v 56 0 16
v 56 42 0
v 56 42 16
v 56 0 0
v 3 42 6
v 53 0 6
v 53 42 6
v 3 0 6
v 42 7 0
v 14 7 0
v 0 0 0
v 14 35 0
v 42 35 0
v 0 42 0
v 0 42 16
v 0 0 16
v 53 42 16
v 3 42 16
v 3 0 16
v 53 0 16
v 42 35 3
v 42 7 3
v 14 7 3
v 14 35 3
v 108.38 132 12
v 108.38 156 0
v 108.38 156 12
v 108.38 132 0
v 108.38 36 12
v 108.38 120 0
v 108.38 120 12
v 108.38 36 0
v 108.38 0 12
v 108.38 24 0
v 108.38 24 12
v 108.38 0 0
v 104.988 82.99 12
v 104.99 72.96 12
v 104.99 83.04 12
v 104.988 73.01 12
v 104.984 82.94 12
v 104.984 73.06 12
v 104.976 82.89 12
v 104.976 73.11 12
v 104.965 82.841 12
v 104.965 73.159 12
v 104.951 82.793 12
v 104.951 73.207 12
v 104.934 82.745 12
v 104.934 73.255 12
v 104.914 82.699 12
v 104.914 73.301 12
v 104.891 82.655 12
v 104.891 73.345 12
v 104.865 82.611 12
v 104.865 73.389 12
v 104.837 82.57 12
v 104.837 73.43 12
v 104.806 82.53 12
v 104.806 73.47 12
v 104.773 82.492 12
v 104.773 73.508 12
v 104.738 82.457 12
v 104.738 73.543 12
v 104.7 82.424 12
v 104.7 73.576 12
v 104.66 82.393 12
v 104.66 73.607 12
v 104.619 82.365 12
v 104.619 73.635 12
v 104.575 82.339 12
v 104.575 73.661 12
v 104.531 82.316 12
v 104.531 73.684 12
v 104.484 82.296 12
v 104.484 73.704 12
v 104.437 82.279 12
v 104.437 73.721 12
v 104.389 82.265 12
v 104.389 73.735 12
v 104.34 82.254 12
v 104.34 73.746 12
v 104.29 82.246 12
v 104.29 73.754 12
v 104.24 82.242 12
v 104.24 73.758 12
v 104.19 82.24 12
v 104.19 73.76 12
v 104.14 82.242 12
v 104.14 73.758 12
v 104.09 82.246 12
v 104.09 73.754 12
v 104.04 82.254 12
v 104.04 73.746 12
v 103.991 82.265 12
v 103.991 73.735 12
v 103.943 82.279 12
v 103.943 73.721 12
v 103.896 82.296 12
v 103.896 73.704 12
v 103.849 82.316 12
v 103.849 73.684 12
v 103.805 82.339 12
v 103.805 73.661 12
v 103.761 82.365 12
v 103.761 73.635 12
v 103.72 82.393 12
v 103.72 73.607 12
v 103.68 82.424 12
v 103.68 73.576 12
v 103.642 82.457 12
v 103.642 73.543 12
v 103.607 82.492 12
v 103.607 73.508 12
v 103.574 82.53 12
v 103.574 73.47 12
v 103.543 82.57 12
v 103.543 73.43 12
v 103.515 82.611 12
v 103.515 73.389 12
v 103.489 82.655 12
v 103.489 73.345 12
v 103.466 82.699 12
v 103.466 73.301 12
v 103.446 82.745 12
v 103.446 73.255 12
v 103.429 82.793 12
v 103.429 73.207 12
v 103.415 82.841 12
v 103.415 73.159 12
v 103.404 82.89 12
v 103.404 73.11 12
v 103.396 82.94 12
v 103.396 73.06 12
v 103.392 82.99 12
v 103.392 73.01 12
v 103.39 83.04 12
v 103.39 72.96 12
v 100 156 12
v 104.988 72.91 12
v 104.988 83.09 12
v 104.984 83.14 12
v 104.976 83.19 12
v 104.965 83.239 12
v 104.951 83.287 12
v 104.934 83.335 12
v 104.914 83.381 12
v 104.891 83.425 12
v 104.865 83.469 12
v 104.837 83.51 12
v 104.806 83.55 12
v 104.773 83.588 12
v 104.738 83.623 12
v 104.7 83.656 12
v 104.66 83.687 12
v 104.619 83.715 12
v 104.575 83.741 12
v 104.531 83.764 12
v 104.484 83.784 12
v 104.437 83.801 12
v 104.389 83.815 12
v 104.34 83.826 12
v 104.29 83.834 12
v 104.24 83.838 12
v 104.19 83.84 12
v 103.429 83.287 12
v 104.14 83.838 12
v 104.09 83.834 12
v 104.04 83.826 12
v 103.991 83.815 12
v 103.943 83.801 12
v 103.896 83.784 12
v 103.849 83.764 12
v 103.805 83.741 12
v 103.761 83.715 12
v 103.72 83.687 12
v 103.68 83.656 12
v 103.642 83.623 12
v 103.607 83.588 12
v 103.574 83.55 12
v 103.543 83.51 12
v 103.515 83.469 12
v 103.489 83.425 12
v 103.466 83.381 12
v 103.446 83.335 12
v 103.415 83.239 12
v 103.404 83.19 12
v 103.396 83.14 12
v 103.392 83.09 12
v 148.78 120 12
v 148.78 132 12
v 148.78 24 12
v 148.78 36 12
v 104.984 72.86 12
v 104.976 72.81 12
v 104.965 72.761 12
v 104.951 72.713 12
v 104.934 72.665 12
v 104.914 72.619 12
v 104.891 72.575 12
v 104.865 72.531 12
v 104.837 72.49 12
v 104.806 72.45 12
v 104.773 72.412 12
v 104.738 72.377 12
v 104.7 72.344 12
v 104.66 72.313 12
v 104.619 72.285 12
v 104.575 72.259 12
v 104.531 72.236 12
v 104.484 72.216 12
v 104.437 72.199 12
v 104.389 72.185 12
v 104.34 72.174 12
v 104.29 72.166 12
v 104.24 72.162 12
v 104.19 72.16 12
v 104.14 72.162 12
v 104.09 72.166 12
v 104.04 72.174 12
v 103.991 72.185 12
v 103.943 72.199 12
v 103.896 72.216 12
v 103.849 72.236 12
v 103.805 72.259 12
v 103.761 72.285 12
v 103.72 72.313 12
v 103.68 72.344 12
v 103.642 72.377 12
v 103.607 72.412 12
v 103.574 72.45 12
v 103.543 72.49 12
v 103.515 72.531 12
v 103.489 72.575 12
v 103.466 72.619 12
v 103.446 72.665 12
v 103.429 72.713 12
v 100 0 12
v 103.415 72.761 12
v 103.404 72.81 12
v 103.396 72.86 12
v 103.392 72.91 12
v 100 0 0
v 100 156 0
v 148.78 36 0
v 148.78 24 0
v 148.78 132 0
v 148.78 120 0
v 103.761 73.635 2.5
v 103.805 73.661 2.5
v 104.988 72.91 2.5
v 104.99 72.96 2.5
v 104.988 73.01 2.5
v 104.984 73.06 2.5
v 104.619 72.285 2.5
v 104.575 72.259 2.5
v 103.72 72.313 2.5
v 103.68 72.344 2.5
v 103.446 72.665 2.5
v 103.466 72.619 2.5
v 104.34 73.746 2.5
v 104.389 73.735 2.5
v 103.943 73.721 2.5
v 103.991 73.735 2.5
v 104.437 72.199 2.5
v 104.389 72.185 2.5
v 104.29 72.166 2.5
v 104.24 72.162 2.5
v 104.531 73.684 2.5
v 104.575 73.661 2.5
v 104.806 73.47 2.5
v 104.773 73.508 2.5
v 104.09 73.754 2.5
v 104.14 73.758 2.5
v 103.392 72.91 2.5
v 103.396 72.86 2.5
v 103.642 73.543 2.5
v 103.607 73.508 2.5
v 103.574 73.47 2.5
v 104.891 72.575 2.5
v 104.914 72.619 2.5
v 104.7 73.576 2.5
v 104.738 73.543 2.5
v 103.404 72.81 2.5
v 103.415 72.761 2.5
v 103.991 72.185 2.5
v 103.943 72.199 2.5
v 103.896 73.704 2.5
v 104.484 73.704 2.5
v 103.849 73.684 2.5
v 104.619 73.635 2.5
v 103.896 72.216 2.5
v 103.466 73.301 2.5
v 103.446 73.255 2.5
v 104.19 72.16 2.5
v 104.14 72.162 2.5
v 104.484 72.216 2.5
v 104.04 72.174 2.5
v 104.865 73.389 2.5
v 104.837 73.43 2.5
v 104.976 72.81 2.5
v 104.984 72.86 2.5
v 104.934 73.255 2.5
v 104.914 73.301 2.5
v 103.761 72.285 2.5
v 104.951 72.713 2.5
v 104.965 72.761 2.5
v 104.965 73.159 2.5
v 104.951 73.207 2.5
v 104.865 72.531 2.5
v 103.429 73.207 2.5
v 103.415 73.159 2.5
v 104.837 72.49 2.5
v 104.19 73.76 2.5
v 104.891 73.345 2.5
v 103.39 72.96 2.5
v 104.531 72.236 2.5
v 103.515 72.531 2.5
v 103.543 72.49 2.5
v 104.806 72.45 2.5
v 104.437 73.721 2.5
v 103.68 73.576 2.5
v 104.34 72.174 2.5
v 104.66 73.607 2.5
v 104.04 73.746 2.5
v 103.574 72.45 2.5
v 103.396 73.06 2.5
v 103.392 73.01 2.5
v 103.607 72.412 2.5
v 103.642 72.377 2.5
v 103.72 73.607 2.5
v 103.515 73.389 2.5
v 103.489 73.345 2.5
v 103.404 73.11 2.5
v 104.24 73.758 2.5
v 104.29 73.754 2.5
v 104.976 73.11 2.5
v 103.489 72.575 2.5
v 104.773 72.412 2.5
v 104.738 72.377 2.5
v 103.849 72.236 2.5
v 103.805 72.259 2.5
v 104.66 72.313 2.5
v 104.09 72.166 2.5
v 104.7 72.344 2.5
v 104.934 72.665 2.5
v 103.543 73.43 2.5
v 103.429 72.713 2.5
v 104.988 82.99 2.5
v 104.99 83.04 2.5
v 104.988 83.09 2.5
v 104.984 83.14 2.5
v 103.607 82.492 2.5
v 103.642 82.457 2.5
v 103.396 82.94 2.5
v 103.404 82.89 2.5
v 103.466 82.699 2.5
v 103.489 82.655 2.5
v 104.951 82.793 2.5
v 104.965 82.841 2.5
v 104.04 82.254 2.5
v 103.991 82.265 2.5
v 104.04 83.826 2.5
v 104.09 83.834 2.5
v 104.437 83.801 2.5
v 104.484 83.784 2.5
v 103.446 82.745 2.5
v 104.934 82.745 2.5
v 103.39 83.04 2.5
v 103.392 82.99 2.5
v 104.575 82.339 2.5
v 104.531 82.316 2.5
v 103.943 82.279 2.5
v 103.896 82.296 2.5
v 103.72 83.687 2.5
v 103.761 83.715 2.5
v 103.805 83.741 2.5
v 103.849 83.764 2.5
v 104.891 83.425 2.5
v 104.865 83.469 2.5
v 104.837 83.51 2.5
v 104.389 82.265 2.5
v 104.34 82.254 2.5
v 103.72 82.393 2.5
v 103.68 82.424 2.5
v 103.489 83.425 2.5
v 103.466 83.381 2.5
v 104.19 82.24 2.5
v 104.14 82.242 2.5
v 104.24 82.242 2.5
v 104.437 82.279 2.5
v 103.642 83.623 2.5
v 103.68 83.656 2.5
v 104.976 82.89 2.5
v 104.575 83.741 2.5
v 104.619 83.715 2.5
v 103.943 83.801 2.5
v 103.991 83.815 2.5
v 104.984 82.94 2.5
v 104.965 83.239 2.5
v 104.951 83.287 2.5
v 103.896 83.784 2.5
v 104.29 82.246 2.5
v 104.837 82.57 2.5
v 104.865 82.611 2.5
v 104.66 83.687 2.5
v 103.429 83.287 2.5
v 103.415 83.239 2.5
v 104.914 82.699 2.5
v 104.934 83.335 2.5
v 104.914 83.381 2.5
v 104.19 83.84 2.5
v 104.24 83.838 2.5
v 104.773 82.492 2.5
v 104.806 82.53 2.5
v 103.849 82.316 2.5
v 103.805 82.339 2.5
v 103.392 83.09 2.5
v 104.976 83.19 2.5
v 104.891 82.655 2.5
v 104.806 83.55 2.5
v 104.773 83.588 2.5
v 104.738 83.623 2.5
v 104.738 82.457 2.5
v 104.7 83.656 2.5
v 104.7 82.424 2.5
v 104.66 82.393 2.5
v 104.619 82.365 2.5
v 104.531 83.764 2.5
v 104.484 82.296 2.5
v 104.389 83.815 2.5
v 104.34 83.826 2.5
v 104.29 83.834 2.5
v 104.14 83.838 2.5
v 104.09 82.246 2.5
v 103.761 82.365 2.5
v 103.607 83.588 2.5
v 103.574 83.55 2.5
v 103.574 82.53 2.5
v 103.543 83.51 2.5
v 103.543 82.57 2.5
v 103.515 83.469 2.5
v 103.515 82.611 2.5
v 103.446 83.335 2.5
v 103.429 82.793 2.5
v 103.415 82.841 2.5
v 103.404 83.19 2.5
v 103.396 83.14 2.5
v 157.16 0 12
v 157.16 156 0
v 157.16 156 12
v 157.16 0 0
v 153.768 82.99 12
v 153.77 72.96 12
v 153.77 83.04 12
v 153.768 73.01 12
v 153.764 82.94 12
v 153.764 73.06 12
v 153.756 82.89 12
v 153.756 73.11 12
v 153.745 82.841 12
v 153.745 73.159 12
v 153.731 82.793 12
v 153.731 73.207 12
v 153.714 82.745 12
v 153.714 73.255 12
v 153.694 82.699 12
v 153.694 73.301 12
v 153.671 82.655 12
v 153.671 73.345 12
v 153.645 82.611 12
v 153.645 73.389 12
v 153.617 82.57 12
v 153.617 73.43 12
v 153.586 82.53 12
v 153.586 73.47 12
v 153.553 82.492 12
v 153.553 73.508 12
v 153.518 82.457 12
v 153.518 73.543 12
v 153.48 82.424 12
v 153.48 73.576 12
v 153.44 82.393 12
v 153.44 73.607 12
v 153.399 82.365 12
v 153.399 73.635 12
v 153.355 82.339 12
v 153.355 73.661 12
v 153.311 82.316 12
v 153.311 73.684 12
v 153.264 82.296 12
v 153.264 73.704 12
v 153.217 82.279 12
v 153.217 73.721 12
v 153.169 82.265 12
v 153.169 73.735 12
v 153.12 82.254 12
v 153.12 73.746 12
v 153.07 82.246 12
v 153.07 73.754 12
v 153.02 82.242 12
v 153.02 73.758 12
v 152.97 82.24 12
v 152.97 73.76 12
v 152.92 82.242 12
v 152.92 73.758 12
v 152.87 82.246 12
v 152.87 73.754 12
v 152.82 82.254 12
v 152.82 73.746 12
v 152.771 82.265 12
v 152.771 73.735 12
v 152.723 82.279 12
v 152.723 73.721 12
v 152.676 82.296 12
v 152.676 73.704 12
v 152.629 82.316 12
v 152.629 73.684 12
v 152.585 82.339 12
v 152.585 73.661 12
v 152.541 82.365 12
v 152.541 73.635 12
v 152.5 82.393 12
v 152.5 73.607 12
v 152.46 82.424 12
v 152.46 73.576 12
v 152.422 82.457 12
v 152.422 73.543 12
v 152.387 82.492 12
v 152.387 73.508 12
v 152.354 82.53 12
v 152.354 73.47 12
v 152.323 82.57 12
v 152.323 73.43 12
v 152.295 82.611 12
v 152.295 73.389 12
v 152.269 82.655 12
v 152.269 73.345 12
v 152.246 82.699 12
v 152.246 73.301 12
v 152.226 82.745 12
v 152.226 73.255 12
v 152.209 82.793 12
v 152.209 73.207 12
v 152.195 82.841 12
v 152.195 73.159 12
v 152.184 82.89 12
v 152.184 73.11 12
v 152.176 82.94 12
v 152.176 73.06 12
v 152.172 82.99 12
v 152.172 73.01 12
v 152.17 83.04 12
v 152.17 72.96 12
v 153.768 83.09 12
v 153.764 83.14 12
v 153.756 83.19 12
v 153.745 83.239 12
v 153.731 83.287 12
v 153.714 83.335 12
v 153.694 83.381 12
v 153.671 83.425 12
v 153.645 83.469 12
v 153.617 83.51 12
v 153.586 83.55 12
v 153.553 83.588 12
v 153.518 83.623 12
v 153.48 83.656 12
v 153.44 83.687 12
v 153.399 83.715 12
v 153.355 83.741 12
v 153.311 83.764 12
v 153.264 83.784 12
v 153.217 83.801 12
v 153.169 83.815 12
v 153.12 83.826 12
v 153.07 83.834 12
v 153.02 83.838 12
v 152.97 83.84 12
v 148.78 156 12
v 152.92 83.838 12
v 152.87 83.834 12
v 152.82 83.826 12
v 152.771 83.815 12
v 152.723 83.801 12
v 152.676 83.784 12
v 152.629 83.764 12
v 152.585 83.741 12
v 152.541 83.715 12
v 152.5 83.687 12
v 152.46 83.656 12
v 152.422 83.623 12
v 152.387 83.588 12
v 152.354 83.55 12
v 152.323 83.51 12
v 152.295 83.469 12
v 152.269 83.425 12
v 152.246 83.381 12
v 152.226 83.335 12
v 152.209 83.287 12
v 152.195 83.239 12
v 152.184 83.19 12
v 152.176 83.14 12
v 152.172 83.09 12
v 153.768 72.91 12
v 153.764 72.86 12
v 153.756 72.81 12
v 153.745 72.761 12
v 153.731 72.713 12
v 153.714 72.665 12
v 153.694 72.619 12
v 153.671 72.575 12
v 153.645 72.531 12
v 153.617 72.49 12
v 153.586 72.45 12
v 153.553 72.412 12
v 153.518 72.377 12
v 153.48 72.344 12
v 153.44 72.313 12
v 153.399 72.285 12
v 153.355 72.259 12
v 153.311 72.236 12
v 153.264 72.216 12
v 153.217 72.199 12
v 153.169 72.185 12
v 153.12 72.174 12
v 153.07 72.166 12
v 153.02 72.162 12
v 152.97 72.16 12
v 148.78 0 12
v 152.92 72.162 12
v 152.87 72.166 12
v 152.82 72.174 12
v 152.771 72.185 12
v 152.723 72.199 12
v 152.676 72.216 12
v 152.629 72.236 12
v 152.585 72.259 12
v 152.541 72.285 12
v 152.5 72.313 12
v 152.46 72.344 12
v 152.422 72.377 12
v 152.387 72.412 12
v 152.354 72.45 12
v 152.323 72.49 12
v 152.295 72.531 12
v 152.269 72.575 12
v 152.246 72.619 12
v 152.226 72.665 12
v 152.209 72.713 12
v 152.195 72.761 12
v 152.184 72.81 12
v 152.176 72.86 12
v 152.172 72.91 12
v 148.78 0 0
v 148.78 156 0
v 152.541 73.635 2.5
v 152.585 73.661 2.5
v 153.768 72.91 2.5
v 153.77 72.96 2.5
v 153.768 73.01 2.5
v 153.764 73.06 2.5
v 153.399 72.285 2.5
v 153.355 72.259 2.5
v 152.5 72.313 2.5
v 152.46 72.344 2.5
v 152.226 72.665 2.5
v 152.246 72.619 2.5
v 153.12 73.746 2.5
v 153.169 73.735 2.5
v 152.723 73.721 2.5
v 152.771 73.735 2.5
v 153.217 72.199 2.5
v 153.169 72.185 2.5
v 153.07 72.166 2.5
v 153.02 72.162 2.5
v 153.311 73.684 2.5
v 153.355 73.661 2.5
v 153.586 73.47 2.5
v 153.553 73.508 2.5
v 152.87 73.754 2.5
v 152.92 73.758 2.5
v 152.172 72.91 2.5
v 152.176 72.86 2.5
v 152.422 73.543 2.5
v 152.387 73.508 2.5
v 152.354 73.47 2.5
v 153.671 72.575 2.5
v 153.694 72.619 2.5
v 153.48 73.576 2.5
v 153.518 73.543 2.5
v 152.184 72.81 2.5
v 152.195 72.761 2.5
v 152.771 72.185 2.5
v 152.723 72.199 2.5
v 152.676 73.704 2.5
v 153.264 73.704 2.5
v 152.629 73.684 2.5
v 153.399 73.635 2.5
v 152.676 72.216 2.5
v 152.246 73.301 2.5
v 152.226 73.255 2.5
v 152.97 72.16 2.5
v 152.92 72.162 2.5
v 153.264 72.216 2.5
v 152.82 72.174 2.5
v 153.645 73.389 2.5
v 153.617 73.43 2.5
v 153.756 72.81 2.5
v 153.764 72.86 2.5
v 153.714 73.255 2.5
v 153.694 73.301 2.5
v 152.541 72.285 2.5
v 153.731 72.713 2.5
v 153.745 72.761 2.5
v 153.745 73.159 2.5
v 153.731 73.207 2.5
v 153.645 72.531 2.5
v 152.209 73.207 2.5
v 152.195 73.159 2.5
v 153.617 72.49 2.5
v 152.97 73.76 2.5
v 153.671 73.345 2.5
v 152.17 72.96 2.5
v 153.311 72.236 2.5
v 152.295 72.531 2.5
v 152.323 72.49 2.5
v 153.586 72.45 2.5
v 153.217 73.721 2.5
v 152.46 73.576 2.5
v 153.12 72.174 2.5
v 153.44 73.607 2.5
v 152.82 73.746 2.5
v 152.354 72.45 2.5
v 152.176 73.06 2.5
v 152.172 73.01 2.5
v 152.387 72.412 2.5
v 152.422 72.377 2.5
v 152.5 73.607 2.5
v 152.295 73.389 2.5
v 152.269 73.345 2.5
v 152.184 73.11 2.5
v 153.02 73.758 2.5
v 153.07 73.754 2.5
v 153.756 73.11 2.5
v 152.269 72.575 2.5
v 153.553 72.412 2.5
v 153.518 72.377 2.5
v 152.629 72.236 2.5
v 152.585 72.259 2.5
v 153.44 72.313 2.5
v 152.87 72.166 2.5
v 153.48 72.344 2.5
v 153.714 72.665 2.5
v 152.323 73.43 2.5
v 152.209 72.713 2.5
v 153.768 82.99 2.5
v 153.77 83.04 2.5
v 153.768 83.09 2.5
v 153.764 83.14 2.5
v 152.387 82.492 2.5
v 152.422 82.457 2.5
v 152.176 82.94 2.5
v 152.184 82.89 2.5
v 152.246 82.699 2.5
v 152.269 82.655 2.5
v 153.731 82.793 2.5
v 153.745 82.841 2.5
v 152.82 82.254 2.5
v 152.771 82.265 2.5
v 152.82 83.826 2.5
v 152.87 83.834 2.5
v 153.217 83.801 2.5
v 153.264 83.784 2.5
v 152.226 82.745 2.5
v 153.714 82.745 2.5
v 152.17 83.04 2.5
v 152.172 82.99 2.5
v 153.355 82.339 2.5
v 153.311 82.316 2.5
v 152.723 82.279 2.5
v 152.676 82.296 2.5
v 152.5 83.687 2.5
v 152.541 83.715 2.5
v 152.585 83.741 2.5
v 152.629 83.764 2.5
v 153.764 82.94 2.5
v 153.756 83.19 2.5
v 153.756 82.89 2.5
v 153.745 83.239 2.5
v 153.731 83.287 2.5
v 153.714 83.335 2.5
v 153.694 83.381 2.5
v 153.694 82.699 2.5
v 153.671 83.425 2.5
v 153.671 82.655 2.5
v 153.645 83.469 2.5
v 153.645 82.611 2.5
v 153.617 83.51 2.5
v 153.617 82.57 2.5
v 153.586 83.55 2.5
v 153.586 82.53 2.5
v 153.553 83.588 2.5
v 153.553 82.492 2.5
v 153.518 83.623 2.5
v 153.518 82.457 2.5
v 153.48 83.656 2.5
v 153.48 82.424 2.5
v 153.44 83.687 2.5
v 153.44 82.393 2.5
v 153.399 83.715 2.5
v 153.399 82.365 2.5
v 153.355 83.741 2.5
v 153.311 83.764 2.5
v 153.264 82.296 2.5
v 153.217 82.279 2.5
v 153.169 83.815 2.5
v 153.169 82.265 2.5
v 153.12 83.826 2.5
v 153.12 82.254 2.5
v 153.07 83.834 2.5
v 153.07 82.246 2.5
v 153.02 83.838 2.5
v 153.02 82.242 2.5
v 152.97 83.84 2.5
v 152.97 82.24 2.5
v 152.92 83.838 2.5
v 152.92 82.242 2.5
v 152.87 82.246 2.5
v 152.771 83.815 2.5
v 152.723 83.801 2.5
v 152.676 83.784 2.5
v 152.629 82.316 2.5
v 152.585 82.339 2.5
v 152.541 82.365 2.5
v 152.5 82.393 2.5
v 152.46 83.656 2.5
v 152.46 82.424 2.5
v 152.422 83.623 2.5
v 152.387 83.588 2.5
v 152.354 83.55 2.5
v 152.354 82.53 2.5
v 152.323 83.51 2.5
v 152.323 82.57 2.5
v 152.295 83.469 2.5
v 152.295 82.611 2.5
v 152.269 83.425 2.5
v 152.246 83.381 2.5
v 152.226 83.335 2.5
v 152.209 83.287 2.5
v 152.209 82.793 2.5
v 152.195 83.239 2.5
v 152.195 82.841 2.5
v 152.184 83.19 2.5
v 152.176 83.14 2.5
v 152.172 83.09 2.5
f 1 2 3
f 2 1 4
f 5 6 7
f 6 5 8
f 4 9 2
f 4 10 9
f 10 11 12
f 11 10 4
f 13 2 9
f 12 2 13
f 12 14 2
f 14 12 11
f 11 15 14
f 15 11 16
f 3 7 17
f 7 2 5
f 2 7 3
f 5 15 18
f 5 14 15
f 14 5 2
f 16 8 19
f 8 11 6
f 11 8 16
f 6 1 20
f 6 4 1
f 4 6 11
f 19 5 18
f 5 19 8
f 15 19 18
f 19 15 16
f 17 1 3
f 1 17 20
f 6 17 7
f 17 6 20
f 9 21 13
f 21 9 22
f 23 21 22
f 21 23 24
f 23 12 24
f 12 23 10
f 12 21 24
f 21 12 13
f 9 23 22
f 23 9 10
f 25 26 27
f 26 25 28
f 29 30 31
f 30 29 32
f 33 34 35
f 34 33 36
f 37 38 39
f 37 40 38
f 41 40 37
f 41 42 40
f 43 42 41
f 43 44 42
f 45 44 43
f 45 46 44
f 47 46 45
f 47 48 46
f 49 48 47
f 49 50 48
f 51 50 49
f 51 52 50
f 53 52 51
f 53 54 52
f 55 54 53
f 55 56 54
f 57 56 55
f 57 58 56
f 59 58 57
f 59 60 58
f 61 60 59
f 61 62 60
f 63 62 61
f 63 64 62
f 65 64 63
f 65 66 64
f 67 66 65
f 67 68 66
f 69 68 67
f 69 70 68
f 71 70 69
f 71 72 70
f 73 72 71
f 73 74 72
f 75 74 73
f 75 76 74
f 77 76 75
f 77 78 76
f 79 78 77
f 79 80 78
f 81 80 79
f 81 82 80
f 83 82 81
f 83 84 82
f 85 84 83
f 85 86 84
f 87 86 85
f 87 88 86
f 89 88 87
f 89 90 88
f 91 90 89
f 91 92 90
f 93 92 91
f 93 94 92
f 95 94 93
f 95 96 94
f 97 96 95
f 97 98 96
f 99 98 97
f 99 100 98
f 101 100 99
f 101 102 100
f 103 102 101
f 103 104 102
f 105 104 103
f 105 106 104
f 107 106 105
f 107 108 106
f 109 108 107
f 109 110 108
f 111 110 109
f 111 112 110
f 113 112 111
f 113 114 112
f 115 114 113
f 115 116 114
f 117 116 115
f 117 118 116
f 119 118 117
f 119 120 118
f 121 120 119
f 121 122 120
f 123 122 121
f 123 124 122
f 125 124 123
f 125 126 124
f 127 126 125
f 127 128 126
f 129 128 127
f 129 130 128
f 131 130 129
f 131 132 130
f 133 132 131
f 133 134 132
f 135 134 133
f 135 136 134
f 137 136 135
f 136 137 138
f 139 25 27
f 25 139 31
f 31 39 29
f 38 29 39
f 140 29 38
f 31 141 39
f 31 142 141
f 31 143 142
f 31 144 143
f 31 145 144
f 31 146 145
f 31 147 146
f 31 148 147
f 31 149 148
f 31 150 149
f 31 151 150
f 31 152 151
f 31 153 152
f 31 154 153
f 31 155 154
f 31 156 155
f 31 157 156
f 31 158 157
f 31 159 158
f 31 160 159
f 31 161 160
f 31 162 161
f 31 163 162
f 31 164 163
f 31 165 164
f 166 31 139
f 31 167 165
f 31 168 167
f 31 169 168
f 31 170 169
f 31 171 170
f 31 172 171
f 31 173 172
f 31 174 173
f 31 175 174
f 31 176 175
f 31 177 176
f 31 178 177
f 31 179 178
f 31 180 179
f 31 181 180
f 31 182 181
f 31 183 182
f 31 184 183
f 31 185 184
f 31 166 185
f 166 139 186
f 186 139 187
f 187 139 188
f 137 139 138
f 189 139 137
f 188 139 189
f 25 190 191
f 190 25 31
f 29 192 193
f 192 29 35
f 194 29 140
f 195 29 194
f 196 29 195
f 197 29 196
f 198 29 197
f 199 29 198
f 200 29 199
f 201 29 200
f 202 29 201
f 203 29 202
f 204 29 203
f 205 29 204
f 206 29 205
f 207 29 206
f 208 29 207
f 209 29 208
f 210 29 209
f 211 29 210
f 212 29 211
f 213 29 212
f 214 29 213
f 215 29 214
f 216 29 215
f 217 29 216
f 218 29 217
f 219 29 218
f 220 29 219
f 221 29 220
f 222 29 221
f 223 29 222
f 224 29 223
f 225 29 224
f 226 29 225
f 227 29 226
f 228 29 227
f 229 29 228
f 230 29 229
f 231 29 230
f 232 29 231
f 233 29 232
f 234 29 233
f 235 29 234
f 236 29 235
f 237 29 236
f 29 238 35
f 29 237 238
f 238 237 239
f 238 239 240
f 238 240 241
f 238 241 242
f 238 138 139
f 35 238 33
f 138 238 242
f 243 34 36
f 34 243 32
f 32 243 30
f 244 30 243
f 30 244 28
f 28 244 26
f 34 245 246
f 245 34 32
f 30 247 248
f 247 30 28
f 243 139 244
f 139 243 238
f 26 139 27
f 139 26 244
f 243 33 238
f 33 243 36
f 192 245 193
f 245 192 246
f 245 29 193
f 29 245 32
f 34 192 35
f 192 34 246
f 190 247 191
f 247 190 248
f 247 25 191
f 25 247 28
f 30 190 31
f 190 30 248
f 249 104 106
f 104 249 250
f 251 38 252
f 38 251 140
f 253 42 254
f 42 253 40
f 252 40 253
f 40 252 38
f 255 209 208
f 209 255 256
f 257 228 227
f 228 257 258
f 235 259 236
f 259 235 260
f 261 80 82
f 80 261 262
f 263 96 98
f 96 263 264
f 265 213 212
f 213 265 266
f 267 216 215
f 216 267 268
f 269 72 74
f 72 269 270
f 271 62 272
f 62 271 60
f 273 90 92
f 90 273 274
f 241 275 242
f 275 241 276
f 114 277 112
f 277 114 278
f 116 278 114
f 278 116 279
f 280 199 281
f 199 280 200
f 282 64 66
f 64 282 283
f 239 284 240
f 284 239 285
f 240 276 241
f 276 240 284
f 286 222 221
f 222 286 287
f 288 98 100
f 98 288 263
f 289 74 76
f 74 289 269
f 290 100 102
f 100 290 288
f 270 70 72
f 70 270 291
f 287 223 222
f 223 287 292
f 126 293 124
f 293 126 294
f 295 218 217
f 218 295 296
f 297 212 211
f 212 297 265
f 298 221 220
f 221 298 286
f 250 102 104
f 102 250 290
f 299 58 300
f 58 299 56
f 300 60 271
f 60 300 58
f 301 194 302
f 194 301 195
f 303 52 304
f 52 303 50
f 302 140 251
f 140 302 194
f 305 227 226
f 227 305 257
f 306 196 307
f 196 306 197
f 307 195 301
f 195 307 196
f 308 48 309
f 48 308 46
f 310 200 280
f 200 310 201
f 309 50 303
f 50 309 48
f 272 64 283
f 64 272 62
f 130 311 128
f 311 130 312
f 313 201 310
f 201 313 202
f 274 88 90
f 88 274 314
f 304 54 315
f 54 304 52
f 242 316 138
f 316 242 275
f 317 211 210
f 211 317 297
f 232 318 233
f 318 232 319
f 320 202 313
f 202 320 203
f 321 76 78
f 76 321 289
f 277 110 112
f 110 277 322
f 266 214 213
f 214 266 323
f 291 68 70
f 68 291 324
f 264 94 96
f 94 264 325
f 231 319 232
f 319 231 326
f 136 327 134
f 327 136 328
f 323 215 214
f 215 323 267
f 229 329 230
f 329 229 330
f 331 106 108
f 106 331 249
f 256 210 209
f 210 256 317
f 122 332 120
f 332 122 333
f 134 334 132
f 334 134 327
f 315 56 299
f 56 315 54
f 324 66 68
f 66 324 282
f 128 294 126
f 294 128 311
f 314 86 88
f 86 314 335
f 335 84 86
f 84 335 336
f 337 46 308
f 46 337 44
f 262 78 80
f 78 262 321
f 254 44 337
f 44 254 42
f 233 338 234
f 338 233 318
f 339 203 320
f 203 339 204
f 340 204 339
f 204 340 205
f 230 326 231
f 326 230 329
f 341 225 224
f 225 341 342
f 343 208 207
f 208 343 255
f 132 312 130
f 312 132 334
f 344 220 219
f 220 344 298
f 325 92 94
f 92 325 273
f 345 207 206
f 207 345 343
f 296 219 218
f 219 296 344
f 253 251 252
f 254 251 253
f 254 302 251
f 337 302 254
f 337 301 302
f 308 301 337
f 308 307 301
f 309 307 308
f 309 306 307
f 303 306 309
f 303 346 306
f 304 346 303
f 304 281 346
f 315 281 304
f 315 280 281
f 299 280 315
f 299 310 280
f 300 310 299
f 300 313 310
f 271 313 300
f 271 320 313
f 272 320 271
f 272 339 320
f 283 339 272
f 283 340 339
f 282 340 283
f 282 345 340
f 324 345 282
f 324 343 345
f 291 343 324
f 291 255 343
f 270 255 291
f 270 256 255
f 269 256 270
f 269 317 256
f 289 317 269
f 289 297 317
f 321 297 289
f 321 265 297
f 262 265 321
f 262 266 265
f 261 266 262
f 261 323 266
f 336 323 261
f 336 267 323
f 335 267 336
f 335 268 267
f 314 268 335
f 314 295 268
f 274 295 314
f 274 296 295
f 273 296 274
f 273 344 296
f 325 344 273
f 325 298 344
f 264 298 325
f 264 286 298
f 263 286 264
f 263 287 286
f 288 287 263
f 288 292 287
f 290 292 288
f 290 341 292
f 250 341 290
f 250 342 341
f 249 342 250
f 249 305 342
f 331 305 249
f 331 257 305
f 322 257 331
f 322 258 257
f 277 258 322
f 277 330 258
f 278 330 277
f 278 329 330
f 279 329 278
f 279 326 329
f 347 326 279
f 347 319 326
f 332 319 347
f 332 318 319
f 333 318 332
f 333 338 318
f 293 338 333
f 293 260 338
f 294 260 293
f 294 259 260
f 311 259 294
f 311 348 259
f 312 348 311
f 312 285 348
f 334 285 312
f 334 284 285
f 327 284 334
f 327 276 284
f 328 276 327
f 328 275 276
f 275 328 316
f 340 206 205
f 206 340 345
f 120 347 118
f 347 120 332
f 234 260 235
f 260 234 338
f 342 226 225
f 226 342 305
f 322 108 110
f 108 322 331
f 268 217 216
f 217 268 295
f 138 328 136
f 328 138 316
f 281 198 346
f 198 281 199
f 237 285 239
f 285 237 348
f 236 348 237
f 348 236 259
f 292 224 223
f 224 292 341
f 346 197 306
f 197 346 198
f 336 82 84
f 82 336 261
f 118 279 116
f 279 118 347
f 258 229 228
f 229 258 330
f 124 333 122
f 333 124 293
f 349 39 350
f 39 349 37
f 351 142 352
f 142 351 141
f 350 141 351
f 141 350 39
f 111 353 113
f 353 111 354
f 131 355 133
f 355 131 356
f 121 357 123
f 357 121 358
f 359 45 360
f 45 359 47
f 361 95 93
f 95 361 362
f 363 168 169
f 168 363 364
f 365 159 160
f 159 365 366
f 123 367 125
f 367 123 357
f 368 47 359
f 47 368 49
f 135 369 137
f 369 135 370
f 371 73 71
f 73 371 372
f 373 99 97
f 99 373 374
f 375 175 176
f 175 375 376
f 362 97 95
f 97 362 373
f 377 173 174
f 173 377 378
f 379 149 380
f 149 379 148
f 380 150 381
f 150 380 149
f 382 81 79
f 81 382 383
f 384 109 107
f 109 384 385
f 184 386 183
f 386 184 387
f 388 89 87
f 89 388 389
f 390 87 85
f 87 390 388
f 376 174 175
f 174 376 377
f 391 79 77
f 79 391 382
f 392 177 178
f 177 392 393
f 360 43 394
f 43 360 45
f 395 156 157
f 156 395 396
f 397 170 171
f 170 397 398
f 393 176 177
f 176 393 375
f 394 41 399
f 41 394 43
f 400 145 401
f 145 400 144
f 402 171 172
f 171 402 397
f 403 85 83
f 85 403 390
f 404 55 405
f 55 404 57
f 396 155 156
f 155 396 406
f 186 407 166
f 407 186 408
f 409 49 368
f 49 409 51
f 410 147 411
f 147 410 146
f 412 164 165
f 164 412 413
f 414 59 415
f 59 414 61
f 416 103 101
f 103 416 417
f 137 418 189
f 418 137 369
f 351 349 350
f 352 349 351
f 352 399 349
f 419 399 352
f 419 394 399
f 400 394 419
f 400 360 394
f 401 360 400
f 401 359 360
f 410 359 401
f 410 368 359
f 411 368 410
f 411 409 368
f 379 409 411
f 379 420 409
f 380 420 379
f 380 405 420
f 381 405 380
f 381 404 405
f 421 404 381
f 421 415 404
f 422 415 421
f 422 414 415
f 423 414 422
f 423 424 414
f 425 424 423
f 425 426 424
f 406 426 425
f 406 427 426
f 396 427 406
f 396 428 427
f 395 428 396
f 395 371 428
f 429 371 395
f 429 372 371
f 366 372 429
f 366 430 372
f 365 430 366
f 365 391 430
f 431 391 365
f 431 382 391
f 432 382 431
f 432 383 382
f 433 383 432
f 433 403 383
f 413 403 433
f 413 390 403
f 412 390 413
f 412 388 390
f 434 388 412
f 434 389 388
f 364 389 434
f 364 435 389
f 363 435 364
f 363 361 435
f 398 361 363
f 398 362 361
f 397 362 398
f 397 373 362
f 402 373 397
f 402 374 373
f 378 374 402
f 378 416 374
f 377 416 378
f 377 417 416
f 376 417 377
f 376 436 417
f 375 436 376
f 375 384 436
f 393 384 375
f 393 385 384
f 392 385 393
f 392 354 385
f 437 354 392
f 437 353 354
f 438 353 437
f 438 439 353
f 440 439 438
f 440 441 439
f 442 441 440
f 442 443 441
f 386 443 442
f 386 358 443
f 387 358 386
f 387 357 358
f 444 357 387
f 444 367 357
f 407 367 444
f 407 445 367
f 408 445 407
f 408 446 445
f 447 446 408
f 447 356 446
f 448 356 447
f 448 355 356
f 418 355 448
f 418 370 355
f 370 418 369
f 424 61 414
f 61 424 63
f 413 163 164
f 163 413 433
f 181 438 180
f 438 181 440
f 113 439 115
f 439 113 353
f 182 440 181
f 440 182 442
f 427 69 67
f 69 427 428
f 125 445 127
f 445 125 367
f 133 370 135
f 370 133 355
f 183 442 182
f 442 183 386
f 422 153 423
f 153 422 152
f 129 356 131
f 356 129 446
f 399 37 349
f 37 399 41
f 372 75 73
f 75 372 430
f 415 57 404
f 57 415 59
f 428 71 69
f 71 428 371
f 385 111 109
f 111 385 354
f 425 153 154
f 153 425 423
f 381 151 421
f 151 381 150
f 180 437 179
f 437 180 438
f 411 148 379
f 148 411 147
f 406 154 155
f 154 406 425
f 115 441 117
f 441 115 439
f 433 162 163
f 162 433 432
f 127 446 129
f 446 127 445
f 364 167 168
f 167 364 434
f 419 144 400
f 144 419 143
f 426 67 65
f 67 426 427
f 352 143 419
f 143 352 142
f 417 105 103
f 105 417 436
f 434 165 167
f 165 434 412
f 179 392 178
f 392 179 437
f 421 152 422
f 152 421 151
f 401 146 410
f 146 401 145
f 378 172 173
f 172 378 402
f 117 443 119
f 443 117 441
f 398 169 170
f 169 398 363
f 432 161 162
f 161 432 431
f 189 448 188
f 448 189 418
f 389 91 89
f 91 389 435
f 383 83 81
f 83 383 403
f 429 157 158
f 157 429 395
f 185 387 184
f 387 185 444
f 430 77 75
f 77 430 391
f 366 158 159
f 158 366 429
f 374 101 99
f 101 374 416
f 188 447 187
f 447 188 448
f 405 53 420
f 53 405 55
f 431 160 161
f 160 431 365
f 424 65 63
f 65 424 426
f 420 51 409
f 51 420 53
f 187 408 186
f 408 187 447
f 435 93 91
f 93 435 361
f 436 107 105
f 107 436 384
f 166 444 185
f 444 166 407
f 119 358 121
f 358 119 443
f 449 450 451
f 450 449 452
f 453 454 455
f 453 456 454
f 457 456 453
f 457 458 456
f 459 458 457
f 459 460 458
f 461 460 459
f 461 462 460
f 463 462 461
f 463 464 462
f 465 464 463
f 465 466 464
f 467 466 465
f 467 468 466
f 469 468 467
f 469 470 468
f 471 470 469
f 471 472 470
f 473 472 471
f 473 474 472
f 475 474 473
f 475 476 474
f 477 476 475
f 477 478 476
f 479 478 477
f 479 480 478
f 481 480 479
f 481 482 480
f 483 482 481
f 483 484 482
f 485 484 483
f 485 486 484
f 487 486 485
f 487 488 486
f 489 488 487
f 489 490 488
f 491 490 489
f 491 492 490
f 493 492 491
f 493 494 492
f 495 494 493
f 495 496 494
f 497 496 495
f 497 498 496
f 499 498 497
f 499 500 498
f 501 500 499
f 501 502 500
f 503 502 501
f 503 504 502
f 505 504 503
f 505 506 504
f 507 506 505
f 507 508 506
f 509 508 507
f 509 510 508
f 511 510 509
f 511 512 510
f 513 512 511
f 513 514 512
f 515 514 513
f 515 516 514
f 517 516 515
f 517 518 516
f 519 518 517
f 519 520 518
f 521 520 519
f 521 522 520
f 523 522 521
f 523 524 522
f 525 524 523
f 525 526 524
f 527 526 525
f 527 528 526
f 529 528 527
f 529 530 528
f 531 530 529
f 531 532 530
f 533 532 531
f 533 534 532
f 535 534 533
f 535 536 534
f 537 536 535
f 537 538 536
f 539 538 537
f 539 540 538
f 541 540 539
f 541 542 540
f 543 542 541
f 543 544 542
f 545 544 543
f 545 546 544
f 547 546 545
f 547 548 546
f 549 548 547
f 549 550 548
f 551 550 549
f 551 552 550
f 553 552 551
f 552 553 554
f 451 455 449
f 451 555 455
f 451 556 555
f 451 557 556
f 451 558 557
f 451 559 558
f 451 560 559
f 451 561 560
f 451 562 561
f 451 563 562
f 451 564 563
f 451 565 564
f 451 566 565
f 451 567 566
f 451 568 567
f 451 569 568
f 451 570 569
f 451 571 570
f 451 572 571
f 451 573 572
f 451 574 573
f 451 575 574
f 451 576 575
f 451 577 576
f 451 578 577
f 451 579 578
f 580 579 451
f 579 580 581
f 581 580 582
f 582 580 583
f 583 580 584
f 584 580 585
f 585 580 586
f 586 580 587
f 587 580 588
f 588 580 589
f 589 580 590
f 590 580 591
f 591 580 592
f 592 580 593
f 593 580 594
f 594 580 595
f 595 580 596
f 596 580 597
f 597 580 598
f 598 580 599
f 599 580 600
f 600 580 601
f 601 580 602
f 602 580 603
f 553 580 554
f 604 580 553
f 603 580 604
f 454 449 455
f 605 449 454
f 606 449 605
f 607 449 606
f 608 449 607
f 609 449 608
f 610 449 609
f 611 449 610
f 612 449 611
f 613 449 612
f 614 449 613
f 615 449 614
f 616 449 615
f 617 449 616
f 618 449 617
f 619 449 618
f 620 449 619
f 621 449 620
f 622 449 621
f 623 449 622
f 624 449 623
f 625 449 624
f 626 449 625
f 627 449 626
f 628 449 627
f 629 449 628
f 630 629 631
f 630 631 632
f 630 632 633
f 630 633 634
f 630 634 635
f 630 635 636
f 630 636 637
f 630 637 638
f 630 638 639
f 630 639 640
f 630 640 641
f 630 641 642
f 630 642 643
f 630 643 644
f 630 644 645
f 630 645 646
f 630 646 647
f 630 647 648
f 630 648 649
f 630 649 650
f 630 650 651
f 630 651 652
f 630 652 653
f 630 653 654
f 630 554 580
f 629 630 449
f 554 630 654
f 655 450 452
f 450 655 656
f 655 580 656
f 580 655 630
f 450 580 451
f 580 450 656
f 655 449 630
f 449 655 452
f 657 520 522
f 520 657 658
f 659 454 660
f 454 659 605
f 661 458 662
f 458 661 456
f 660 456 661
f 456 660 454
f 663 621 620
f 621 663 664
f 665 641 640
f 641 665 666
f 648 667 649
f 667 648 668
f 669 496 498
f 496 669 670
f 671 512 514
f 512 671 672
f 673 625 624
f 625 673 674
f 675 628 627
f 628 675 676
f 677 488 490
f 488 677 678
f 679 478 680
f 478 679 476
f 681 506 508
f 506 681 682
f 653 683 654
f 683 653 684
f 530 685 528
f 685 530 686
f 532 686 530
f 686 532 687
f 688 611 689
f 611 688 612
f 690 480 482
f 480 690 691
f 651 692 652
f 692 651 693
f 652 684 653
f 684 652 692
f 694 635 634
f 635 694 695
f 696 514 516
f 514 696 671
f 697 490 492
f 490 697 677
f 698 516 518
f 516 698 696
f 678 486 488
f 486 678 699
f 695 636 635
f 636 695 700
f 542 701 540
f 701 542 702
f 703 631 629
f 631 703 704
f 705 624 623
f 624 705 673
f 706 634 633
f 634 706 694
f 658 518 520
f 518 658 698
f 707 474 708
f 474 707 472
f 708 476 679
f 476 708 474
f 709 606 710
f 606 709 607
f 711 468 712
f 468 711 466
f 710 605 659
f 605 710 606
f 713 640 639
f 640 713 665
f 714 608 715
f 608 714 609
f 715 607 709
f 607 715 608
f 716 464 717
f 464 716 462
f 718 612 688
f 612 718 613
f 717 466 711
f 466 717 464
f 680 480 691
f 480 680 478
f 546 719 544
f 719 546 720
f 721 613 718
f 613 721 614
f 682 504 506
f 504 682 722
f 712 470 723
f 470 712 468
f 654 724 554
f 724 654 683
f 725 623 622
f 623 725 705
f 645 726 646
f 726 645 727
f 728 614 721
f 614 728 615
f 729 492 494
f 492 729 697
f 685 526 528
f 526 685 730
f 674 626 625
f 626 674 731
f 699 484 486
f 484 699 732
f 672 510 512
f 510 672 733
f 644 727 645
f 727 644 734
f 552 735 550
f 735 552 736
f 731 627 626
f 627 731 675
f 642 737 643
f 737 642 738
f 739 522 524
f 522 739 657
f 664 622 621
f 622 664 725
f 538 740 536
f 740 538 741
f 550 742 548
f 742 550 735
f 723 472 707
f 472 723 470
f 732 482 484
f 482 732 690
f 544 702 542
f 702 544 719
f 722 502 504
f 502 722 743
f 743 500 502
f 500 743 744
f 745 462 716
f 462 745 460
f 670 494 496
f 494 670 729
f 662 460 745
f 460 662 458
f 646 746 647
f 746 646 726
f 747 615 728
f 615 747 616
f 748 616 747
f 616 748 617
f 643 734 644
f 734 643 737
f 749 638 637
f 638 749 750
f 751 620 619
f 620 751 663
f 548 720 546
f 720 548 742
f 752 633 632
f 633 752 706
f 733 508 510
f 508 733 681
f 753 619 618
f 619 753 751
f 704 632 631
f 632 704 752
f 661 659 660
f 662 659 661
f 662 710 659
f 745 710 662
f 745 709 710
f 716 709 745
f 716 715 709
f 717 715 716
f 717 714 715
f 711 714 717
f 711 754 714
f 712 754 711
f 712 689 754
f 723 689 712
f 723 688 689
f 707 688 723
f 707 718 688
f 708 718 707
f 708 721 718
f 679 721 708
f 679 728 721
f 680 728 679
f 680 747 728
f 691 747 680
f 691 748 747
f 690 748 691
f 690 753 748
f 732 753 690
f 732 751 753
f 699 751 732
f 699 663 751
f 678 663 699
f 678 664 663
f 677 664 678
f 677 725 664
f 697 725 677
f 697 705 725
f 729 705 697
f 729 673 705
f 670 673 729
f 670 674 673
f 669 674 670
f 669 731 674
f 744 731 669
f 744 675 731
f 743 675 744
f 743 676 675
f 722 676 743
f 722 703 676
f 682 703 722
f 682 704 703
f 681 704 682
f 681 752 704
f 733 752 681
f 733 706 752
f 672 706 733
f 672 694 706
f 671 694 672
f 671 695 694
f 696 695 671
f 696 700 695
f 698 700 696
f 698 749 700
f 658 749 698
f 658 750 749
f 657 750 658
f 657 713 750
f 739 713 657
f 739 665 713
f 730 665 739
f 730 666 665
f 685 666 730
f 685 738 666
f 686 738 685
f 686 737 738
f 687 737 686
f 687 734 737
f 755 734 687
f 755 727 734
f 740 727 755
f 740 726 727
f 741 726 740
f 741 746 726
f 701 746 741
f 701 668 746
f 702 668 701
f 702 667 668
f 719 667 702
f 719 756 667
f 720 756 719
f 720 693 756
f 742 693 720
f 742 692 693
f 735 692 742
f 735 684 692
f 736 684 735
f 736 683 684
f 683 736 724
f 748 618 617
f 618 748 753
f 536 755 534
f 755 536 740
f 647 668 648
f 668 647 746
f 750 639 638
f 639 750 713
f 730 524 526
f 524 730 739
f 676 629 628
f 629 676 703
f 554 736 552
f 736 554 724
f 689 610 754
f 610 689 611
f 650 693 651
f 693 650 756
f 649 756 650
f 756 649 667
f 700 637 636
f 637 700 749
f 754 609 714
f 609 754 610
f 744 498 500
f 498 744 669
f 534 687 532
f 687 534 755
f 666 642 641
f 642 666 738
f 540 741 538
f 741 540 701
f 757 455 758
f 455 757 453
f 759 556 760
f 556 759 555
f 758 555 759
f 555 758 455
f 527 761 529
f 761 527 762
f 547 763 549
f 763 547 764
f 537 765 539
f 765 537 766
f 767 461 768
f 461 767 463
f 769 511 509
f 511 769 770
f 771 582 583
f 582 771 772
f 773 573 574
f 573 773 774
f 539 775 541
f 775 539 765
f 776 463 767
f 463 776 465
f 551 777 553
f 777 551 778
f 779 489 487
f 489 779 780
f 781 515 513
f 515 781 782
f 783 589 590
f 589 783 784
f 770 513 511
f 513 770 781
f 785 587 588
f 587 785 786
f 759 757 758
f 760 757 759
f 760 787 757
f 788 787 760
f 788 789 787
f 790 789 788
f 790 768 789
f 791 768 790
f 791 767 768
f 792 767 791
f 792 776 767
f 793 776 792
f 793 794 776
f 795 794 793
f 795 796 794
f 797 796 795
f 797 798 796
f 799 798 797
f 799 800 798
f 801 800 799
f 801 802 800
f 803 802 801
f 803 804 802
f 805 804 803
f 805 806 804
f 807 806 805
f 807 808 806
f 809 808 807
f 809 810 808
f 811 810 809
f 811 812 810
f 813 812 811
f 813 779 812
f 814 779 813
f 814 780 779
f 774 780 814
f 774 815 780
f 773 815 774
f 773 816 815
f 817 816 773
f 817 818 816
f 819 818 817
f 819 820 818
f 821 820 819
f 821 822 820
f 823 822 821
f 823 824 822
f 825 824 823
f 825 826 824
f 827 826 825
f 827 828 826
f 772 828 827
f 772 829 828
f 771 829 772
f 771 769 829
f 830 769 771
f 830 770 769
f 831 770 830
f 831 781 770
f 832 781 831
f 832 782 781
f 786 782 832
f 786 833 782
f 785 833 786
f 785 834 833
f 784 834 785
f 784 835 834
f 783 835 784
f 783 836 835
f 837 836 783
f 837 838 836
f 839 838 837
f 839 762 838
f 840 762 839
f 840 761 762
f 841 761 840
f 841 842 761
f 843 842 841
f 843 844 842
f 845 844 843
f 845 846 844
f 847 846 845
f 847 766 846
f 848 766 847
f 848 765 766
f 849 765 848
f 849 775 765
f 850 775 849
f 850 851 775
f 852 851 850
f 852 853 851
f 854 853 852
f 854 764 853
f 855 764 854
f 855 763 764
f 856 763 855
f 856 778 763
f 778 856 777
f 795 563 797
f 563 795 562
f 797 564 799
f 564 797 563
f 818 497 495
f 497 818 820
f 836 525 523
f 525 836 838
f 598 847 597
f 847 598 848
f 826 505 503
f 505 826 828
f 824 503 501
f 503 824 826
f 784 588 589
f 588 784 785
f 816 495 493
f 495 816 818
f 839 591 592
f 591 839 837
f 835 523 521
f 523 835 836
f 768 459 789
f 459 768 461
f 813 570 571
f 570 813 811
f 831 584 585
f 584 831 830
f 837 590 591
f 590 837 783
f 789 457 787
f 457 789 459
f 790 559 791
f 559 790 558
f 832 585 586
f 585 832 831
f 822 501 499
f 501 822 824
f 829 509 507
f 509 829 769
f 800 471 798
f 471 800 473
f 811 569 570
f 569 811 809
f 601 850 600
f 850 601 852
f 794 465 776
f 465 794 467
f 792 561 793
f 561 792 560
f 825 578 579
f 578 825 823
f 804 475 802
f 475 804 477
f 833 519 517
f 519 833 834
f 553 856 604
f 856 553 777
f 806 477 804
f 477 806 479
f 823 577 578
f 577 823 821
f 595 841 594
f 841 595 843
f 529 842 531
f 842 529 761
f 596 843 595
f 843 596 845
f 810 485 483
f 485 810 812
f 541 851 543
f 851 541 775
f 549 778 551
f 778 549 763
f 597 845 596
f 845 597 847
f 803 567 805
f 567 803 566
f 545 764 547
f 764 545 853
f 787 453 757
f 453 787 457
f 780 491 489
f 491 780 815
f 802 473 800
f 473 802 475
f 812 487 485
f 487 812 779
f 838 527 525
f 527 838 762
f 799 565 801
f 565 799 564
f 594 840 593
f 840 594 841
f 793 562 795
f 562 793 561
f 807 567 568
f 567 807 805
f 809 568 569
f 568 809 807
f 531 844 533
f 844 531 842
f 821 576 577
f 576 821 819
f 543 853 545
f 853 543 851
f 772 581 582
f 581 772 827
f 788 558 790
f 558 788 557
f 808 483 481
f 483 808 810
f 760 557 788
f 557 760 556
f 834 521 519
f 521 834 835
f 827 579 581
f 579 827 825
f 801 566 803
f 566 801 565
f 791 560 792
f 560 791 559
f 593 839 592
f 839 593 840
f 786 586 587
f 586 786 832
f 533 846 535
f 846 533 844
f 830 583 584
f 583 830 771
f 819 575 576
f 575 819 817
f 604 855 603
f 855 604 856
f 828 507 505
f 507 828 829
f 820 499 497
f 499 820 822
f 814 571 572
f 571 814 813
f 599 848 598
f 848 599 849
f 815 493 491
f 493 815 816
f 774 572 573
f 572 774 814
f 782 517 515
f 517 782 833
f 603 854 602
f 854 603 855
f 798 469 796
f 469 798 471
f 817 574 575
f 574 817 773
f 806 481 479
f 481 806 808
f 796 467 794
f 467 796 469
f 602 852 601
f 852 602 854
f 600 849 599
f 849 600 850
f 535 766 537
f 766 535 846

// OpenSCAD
wall = 3;
height = 80;
thick = 3;
totalThick = 6;
boxInternalLen = 150;
platformWdh = 10;
platformLen = 50;
nfcReaderSupporterInternalWidth = 15.6;
nfcReaderLen = 122;
nfcReaderWdhHalf = 37;
step = nfcReaderSupporterInternalWidth + wall;

tunnelHeight = 42;
slot = 28;

width = 8.38;
length = boxInternalLen + 2 * thick;
dist = 10.08;

difference(){
    union(){
        cube([platformLen + 2 * wall, tunnelHeight, wall + 3],false);
        translate([0, 0, wall + 3])
        cube([wall, tunnelHeight, platformWdh],false);
        translate([platformLen + wall, 0, wall + 3])
        cube([wall, tunnelHeight, platformWdh],false);
    }
    translate([(platformLen + 2 * wall - slot) / 2, (tunnelHeight - slot) / 2, 0])
    cube([slot, slot, wall],false);
}


translate([100, 0, 0])
difference(){
    union(){
        cube([width, length, 12],false);
        translate([width, 24, 0])
        cube([40.4, 12, 12],false);
        translate([width, length - 24 - 12, 0])
        cube([40.4, 12, 12],false);
    }   
    translate([width / 2, (length - dist) / 2, 2.5])
    cylinder (h = 9.5, r = 0.8, $fn=100);
    translate([width / 2, (length - dist) / 2 + 10.08, 2.5])
    cylinder (h = 9.5, r = 0.8, $fn=100);  
}

translate([100 + width + 40.4, 0, 0])
difference(){
    cube([width, length, 12],false);
    translate([width / 2, (length - dist) / 2, 2.5])
    cylinder (h = 9.5, r = 0.8, $fn=100);
    translate([width / 2, (length - dist) / 2 + 10.08, 2.5])
    cylinder (h = 9.5, r = 0.8, $fn=100);  
}
